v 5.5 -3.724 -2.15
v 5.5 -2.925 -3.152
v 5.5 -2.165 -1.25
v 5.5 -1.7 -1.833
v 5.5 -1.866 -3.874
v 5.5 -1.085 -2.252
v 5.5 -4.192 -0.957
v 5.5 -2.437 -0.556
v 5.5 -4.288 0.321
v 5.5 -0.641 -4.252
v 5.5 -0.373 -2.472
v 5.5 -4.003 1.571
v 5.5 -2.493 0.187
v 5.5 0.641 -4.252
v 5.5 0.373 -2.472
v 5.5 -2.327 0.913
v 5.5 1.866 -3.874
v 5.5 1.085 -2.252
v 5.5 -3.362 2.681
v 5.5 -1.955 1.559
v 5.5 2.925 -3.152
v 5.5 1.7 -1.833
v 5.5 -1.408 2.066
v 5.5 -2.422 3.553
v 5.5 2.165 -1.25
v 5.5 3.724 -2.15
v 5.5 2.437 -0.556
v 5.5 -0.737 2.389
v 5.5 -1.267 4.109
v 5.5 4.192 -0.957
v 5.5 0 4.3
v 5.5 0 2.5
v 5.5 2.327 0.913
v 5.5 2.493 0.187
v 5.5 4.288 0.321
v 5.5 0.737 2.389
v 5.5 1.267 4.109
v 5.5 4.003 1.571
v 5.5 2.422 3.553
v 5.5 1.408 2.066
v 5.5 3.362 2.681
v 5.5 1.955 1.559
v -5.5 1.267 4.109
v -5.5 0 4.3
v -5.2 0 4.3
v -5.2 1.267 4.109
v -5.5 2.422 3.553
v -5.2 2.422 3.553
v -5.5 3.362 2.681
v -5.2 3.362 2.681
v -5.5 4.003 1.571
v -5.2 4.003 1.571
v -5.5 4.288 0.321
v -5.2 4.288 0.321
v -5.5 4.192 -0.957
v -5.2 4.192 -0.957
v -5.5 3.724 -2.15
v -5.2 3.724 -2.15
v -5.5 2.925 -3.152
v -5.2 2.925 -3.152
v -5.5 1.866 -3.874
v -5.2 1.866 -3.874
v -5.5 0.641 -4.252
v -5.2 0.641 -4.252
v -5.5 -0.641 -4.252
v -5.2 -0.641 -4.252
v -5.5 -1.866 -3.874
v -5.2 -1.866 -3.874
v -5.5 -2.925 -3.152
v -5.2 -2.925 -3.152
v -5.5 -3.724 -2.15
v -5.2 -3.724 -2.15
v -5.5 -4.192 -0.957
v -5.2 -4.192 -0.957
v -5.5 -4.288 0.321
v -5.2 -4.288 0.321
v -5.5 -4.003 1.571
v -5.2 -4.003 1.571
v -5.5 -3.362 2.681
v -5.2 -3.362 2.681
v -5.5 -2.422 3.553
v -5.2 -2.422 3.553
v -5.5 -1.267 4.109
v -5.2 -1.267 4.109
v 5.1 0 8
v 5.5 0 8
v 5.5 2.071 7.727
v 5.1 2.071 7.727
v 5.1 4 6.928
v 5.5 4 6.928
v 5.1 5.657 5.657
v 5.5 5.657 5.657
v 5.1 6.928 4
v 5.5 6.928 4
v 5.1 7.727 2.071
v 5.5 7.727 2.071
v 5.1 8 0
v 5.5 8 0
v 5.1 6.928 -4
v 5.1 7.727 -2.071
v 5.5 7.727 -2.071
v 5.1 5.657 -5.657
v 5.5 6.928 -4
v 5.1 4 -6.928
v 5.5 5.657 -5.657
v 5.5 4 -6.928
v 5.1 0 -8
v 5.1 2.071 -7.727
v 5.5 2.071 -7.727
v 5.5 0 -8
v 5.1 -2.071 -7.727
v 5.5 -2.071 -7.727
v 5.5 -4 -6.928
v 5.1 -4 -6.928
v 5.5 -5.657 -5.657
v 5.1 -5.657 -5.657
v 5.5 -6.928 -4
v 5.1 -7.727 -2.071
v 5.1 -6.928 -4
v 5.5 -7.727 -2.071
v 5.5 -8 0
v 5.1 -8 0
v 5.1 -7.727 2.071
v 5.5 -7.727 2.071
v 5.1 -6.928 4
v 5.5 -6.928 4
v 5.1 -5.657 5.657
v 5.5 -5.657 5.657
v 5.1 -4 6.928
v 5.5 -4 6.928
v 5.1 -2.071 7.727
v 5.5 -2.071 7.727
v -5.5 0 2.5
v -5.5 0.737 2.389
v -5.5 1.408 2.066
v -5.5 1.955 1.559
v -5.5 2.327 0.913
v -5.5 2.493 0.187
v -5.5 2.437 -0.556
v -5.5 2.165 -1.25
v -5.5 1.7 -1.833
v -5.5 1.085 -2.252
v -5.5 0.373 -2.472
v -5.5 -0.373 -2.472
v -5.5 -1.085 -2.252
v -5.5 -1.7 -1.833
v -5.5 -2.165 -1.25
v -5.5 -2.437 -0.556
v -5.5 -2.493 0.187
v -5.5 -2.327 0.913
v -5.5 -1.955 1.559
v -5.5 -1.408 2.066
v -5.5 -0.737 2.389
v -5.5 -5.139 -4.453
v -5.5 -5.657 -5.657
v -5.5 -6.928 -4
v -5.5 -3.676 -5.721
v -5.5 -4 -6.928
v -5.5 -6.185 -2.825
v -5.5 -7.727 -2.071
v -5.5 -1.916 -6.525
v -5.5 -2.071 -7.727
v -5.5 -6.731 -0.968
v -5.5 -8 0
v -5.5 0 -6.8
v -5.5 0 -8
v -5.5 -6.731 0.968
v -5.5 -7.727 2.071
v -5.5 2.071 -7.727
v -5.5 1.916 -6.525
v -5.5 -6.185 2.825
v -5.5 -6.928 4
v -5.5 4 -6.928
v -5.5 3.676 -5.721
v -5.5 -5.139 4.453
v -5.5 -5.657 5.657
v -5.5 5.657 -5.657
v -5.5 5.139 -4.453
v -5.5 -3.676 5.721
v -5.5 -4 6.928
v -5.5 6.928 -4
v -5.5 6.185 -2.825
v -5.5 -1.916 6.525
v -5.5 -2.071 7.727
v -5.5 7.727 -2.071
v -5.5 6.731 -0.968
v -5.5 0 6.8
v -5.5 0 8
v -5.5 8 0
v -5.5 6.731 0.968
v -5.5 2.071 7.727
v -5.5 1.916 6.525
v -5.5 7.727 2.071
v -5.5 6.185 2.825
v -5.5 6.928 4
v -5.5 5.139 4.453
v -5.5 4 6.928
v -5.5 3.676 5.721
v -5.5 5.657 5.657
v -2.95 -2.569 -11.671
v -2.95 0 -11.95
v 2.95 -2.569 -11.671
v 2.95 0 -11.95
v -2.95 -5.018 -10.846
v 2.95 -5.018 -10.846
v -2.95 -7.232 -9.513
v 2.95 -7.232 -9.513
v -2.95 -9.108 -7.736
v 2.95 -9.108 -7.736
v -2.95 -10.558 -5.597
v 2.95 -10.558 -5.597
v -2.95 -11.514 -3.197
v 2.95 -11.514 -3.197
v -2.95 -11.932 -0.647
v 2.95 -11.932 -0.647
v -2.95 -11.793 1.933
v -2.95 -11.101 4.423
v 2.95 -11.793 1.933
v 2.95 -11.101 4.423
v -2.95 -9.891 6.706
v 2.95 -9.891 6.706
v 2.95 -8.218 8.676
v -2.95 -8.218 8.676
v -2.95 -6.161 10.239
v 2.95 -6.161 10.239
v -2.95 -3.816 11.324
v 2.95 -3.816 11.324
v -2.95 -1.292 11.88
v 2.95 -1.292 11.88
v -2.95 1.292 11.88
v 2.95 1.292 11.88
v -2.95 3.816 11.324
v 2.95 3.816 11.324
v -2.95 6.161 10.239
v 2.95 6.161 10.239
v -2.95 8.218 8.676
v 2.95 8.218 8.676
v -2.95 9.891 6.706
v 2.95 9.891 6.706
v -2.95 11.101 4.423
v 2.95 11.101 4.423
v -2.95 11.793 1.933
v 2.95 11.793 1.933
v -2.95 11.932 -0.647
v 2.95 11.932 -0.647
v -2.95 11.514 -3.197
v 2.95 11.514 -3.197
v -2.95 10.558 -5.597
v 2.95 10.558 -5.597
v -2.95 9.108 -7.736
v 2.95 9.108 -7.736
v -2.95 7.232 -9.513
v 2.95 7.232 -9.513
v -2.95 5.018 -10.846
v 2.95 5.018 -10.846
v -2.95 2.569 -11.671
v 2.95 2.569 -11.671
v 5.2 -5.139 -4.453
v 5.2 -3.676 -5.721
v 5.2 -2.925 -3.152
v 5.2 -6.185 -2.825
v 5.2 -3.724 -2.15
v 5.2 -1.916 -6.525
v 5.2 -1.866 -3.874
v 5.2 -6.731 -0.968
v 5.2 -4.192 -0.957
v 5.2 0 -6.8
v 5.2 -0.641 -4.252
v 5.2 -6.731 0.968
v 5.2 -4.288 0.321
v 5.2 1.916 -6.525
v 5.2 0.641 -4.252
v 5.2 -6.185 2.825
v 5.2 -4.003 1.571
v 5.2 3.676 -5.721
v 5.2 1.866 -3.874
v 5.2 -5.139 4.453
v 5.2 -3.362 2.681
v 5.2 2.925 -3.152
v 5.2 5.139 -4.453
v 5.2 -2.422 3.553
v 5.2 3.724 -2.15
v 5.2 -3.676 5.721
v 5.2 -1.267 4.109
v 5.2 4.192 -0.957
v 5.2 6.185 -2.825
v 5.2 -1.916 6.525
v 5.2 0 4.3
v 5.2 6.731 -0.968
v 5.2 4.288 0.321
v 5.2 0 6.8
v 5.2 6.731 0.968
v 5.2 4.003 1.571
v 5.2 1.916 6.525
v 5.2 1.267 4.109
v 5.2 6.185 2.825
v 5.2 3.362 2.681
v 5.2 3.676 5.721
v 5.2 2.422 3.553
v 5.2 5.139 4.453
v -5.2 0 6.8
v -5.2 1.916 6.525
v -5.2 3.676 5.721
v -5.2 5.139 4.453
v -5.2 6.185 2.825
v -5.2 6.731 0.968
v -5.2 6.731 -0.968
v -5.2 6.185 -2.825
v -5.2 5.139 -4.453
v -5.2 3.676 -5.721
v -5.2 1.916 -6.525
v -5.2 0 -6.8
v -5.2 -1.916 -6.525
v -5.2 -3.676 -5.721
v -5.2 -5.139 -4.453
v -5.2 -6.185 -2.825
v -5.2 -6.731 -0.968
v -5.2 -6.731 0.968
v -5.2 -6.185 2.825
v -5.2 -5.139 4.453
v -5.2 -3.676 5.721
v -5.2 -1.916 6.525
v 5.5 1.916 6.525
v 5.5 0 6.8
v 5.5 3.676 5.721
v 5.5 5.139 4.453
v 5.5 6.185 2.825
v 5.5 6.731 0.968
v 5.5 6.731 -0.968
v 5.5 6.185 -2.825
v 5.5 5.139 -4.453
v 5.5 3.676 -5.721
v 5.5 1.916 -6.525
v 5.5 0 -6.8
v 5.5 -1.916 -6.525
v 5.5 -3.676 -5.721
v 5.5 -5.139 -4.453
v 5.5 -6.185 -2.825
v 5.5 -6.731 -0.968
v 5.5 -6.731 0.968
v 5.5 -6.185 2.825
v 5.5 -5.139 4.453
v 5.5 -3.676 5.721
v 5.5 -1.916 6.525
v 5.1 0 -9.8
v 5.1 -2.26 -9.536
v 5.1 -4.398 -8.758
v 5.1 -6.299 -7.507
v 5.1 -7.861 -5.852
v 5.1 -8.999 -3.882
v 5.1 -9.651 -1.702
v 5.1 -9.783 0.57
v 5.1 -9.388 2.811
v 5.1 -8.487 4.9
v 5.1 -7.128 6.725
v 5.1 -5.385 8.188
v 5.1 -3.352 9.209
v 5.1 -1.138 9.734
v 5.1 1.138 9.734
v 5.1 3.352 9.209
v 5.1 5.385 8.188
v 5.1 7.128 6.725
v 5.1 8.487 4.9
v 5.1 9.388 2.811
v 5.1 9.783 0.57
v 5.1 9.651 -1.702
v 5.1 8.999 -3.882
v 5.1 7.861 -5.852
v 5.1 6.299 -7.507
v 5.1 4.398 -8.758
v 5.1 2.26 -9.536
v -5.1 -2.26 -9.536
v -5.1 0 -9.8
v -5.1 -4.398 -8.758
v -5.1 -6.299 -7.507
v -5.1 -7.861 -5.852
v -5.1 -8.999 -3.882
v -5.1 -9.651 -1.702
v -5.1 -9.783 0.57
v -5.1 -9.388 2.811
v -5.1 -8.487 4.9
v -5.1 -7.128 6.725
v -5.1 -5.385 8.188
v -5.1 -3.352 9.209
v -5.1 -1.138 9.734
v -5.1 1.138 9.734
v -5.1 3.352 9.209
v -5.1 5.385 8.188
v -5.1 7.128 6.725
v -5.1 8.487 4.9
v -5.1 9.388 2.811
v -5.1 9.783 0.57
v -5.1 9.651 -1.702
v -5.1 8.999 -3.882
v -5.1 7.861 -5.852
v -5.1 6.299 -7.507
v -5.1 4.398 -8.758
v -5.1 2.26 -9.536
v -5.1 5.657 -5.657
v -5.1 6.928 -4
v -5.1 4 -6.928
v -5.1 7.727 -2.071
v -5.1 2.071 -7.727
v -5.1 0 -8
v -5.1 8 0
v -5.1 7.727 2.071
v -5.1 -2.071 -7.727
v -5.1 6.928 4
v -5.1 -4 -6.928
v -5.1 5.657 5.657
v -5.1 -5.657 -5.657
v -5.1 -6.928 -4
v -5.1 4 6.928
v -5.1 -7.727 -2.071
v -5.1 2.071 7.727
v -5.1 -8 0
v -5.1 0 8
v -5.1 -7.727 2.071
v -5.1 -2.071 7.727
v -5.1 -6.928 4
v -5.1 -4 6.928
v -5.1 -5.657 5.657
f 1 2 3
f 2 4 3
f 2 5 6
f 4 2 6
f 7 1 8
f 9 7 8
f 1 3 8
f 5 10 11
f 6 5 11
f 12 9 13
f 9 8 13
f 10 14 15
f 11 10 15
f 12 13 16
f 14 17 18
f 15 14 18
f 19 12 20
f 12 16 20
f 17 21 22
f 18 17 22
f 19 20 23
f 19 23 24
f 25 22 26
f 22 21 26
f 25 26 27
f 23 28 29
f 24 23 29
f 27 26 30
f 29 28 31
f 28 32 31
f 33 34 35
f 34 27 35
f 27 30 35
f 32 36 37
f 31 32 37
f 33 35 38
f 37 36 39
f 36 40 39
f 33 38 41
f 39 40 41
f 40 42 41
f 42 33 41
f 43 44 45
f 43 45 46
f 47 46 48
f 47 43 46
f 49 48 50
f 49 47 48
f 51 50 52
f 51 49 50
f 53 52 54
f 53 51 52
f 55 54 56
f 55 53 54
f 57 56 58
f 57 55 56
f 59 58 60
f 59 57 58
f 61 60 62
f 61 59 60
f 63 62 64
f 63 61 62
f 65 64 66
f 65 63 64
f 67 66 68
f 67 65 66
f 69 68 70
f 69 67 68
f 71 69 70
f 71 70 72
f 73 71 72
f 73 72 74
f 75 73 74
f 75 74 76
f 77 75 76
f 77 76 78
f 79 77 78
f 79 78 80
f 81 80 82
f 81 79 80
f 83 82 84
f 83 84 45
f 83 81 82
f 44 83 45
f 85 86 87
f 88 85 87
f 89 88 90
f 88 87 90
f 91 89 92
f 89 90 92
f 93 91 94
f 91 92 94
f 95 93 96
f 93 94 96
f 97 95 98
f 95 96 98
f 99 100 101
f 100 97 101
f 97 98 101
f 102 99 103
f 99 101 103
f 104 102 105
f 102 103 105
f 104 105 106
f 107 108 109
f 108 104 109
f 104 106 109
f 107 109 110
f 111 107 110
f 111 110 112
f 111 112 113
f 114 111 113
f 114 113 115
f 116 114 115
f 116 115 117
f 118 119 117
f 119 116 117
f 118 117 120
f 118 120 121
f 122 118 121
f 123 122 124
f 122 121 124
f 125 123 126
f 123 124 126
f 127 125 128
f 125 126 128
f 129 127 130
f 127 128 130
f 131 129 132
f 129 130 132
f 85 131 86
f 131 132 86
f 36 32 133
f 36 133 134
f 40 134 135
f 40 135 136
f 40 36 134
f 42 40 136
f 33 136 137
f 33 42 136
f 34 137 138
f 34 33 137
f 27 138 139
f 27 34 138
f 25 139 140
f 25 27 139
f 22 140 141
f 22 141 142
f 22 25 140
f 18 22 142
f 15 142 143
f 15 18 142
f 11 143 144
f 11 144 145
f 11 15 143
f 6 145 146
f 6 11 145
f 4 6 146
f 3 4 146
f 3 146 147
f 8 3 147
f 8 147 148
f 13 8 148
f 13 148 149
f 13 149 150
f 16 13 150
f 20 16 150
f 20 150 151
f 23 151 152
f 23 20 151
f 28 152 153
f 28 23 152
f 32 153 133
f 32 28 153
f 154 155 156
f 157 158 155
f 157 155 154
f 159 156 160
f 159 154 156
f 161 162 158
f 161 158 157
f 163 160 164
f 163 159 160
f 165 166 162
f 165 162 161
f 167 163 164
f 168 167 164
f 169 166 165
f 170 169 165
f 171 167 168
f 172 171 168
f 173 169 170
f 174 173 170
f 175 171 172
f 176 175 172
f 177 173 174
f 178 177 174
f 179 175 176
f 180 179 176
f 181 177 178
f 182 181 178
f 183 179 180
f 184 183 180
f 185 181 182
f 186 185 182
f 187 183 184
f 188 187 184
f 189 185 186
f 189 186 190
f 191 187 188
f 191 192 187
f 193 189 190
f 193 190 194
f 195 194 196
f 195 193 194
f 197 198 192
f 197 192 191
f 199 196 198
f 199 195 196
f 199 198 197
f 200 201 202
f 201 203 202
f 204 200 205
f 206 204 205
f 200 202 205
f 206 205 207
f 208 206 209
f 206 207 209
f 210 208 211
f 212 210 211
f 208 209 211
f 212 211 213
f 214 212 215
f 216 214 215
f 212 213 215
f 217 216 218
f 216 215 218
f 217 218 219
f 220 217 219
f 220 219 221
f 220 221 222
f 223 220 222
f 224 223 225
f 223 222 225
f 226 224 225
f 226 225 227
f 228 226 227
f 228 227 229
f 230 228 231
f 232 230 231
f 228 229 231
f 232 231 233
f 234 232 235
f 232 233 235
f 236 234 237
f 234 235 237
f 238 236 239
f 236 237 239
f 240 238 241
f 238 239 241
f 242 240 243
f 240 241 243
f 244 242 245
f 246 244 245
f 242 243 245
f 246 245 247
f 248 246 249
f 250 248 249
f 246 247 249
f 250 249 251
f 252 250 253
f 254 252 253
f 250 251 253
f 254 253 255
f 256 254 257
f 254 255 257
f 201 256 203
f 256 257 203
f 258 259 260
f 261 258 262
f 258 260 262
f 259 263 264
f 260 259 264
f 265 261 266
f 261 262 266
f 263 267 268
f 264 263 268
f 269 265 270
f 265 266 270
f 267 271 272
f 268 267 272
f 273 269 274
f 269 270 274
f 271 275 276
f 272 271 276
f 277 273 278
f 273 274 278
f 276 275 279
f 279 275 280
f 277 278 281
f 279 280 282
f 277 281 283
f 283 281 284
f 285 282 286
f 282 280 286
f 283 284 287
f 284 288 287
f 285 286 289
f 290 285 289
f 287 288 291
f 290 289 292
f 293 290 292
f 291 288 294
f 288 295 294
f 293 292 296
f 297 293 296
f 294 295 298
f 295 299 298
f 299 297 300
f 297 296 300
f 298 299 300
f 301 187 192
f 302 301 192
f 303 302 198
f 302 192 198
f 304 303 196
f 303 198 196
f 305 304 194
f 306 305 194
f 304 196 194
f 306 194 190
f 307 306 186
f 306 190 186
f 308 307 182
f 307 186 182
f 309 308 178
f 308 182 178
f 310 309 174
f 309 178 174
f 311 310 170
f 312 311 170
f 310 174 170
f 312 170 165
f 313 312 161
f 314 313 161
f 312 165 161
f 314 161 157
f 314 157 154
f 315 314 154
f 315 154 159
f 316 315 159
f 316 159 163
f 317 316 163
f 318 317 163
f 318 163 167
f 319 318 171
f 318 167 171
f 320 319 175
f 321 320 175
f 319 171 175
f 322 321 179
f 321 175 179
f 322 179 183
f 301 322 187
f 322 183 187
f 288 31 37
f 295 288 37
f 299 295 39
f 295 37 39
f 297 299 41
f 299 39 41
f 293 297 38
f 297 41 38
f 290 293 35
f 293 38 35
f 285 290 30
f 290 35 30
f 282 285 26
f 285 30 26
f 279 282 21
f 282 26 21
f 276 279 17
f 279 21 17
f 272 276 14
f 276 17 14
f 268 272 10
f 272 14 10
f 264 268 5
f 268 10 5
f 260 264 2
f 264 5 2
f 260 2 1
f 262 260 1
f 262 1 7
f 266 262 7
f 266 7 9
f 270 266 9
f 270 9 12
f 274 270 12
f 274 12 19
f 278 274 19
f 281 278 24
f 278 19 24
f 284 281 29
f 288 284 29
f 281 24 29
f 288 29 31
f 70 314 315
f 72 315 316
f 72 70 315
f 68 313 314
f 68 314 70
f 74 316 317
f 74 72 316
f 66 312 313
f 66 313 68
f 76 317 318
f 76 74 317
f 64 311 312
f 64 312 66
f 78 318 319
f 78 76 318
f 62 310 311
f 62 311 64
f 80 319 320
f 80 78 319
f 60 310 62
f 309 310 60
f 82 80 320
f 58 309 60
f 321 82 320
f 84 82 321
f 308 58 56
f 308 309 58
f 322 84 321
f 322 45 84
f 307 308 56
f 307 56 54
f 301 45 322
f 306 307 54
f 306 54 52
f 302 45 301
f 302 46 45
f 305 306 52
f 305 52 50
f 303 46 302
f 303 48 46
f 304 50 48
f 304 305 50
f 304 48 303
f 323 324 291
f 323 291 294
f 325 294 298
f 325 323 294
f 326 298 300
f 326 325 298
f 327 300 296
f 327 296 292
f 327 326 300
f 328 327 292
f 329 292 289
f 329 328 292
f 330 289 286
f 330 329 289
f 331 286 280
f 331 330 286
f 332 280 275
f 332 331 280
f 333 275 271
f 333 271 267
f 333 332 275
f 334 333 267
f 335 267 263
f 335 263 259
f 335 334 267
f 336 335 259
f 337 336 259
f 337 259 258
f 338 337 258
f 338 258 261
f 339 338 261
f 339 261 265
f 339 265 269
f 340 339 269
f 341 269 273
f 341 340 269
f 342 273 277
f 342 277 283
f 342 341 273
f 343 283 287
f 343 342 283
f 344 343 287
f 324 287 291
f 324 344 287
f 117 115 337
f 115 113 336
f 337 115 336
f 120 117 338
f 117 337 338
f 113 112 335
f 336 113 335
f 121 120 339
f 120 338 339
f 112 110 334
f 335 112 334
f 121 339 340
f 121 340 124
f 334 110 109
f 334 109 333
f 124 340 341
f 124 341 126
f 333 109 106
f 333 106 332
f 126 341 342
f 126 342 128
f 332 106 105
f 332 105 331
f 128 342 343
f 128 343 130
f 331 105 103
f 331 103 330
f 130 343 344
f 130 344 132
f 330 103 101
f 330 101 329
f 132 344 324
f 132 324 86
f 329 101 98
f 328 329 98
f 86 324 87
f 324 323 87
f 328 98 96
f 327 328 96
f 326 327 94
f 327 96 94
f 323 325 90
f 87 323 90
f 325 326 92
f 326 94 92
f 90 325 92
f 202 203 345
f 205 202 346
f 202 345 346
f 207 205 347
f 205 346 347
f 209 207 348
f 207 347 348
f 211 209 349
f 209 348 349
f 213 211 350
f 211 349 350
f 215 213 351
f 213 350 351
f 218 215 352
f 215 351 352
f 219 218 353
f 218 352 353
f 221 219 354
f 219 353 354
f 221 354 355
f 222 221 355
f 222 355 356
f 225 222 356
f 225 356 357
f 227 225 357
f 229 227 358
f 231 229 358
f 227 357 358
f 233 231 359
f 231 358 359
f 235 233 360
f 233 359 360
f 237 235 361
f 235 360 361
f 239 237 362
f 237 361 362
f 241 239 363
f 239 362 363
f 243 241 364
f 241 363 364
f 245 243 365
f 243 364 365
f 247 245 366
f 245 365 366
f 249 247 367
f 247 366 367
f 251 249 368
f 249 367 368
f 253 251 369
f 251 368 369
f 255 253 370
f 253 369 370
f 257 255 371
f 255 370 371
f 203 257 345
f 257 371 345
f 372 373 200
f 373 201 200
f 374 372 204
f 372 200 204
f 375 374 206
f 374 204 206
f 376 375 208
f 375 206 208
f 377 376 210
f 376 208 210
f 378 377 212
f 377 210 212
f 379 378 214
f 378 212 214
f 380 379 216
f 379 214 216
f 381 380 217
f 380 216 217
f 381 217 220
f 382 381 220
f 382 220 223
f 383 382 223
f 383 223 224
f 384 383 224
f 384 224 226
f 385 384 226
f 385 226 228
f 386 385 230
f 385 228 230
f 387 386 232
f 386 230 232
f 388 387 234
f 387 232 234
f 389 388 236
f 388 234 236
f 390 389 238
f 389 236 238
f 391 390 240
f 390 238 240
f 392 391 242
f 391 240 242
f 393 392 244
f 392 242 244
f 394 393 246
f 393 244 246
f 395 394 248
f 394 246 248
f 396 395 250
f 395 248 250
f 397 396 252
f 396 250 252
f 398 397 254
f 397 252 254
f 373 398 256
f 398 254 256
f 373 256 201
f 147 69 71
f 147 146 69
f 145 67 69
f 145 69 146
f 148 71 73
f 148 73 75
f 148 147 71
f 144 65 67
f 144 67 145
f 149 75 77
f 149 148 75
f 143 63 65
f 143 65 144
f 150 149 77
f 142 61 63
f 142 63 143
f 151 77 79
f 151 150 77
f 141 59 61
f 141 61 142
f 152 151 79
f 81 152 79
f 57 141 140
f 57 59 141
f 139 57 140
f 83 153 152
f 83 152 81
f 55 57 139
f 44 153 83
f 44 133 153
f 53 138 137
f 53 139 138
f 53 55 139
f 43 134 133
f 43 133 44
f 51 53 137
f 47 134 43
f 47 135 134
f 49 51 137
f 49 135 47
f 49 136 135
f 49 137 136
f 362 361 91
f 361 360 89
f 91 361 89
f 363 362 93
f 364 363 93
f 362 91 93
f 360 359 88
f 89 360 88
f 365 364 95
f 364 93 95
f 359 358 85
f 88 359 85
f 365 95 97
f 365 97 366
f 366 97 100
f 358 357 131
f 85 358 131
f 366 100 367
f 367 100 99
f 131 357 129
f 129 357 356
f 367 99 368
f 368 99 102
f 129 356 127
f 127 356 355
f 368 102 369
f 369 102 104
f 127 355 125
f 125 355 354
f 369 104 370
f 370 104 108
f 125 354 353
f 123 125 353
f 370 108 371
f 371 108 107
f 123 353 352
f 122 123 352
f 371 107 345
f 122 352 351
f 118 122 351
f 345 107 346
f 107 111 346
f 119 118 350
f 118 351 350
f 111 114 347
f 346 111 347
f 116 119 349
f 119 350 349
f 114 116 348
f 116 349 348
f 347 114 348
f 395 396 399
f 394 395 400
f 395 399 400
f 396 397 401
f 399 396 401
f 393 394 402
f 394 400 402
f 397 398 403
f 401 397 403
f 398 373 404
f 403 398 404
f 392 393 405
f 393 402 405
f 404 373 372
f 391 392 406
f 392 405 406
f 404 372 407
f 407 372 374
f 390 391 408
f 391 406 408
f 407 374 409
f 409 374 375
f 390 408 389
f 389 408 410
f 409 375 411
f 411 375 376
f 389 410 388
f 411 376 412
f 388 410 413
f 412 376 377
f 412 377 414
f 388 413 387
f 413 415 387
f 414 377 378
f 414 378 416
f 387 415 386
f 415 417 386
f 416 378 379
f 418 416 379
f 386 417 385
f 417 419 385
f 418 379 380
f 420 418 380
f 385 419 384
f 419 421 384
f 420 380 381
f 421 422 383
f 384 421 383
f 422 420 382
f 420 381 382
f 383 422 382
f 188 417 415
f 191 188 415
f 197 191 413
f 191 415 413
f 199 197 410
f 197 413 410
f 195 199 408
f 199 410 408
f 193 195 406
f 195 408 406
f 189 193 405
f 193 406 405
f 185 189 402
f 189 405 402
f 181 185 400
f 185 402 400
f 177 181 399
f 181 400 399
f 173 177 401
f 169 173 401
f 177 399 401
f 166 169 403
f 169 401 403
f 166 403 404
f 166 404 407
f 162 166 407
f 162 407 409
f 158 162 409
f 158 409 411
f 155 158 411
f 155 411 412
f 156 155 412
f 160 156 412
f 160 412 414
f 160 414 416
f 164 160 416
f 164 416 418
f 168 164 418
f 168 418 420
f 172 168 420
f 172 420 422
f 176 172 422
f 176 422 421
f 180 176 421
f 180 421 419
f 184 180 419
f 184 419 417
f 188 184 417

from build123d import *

# Parameters (mm, degrees)
BOSS_EXTRU_1_DEPTH      = 0.4
BOSS_EXTRU_1_DEPTH_BACK = 10.6
ESQUISSE1_R             = 8
ESQUISSE1_R_2           = 2.5
ESQUISSE2_R             = 6.8
ESQUISSE2_R_2           = 4.3
ENL_V_MAT_EXTRU_1_DEPTH = 0.3


with BuildPart() as part:
    # Sketch1 → Revolve1 (revolve)
    with BuildSketch(Plane.XY, mode=Mode.PRIVATE) as revolve1_sk:
        Polygon((0.5, 7), (-0.5, 7), (-0.5, 8), (-5.1, 8), (-5.1, 9.8), (-2.95, 11.95), (2.95, 11.95), (5.1, 9.8), (5.1, 8), (0.5, 8), align=None)
    revolve(revolve1_sk.sketch.rotate(Axis((0, 0, 0), (-1, 0, 0)), 90), axis=Axis((0, 0, 0), (-1, 0, 0)))

    # Esquisse1 → Boss.-Extru.1 (add, two sides: drawn at the far end of the back side and taken through both)
    with BuildSketch(Plane.ZY.offset(5.1).offset(-BOSS_EXTRU_1_DEPTH_BACK)):
        Circle(ESQUISSE1_R)
        Circle(ESQUISSE1_R_2, mode=Mode.SUBTRACT)
    extrude(amount=BOSS_EXTRU_1_DEPTH + BOSS_EXTRU_1_DEPTH_BACK)

    # Esquisse2 → Enlèv. mat.-Extru.1 (cut)
    with BuildSketch(Plane.ZY.offset(5.5)):
        Circle(ESQUISSE2_R)
        Circle(ESQUISSE2_R_2, mode=Mode.SUBTRACT)
    enl_v_mat_extru_1 = extrude(amount=-ENL_V_MAT_EXTRU_1_DEPTH, mode=Mode.SUBTRACT)

    # Symétrie1: Enlèv. mat.-Extru.1 across plane
    add(enl_v_mat_extru_1.mirror(Plane(origin=(0, 0, 0), x_dir=(0, 0, 1), z_dir=(1, 0, 0))), mode=Mode.SUBTRACT)


solid = part.part
